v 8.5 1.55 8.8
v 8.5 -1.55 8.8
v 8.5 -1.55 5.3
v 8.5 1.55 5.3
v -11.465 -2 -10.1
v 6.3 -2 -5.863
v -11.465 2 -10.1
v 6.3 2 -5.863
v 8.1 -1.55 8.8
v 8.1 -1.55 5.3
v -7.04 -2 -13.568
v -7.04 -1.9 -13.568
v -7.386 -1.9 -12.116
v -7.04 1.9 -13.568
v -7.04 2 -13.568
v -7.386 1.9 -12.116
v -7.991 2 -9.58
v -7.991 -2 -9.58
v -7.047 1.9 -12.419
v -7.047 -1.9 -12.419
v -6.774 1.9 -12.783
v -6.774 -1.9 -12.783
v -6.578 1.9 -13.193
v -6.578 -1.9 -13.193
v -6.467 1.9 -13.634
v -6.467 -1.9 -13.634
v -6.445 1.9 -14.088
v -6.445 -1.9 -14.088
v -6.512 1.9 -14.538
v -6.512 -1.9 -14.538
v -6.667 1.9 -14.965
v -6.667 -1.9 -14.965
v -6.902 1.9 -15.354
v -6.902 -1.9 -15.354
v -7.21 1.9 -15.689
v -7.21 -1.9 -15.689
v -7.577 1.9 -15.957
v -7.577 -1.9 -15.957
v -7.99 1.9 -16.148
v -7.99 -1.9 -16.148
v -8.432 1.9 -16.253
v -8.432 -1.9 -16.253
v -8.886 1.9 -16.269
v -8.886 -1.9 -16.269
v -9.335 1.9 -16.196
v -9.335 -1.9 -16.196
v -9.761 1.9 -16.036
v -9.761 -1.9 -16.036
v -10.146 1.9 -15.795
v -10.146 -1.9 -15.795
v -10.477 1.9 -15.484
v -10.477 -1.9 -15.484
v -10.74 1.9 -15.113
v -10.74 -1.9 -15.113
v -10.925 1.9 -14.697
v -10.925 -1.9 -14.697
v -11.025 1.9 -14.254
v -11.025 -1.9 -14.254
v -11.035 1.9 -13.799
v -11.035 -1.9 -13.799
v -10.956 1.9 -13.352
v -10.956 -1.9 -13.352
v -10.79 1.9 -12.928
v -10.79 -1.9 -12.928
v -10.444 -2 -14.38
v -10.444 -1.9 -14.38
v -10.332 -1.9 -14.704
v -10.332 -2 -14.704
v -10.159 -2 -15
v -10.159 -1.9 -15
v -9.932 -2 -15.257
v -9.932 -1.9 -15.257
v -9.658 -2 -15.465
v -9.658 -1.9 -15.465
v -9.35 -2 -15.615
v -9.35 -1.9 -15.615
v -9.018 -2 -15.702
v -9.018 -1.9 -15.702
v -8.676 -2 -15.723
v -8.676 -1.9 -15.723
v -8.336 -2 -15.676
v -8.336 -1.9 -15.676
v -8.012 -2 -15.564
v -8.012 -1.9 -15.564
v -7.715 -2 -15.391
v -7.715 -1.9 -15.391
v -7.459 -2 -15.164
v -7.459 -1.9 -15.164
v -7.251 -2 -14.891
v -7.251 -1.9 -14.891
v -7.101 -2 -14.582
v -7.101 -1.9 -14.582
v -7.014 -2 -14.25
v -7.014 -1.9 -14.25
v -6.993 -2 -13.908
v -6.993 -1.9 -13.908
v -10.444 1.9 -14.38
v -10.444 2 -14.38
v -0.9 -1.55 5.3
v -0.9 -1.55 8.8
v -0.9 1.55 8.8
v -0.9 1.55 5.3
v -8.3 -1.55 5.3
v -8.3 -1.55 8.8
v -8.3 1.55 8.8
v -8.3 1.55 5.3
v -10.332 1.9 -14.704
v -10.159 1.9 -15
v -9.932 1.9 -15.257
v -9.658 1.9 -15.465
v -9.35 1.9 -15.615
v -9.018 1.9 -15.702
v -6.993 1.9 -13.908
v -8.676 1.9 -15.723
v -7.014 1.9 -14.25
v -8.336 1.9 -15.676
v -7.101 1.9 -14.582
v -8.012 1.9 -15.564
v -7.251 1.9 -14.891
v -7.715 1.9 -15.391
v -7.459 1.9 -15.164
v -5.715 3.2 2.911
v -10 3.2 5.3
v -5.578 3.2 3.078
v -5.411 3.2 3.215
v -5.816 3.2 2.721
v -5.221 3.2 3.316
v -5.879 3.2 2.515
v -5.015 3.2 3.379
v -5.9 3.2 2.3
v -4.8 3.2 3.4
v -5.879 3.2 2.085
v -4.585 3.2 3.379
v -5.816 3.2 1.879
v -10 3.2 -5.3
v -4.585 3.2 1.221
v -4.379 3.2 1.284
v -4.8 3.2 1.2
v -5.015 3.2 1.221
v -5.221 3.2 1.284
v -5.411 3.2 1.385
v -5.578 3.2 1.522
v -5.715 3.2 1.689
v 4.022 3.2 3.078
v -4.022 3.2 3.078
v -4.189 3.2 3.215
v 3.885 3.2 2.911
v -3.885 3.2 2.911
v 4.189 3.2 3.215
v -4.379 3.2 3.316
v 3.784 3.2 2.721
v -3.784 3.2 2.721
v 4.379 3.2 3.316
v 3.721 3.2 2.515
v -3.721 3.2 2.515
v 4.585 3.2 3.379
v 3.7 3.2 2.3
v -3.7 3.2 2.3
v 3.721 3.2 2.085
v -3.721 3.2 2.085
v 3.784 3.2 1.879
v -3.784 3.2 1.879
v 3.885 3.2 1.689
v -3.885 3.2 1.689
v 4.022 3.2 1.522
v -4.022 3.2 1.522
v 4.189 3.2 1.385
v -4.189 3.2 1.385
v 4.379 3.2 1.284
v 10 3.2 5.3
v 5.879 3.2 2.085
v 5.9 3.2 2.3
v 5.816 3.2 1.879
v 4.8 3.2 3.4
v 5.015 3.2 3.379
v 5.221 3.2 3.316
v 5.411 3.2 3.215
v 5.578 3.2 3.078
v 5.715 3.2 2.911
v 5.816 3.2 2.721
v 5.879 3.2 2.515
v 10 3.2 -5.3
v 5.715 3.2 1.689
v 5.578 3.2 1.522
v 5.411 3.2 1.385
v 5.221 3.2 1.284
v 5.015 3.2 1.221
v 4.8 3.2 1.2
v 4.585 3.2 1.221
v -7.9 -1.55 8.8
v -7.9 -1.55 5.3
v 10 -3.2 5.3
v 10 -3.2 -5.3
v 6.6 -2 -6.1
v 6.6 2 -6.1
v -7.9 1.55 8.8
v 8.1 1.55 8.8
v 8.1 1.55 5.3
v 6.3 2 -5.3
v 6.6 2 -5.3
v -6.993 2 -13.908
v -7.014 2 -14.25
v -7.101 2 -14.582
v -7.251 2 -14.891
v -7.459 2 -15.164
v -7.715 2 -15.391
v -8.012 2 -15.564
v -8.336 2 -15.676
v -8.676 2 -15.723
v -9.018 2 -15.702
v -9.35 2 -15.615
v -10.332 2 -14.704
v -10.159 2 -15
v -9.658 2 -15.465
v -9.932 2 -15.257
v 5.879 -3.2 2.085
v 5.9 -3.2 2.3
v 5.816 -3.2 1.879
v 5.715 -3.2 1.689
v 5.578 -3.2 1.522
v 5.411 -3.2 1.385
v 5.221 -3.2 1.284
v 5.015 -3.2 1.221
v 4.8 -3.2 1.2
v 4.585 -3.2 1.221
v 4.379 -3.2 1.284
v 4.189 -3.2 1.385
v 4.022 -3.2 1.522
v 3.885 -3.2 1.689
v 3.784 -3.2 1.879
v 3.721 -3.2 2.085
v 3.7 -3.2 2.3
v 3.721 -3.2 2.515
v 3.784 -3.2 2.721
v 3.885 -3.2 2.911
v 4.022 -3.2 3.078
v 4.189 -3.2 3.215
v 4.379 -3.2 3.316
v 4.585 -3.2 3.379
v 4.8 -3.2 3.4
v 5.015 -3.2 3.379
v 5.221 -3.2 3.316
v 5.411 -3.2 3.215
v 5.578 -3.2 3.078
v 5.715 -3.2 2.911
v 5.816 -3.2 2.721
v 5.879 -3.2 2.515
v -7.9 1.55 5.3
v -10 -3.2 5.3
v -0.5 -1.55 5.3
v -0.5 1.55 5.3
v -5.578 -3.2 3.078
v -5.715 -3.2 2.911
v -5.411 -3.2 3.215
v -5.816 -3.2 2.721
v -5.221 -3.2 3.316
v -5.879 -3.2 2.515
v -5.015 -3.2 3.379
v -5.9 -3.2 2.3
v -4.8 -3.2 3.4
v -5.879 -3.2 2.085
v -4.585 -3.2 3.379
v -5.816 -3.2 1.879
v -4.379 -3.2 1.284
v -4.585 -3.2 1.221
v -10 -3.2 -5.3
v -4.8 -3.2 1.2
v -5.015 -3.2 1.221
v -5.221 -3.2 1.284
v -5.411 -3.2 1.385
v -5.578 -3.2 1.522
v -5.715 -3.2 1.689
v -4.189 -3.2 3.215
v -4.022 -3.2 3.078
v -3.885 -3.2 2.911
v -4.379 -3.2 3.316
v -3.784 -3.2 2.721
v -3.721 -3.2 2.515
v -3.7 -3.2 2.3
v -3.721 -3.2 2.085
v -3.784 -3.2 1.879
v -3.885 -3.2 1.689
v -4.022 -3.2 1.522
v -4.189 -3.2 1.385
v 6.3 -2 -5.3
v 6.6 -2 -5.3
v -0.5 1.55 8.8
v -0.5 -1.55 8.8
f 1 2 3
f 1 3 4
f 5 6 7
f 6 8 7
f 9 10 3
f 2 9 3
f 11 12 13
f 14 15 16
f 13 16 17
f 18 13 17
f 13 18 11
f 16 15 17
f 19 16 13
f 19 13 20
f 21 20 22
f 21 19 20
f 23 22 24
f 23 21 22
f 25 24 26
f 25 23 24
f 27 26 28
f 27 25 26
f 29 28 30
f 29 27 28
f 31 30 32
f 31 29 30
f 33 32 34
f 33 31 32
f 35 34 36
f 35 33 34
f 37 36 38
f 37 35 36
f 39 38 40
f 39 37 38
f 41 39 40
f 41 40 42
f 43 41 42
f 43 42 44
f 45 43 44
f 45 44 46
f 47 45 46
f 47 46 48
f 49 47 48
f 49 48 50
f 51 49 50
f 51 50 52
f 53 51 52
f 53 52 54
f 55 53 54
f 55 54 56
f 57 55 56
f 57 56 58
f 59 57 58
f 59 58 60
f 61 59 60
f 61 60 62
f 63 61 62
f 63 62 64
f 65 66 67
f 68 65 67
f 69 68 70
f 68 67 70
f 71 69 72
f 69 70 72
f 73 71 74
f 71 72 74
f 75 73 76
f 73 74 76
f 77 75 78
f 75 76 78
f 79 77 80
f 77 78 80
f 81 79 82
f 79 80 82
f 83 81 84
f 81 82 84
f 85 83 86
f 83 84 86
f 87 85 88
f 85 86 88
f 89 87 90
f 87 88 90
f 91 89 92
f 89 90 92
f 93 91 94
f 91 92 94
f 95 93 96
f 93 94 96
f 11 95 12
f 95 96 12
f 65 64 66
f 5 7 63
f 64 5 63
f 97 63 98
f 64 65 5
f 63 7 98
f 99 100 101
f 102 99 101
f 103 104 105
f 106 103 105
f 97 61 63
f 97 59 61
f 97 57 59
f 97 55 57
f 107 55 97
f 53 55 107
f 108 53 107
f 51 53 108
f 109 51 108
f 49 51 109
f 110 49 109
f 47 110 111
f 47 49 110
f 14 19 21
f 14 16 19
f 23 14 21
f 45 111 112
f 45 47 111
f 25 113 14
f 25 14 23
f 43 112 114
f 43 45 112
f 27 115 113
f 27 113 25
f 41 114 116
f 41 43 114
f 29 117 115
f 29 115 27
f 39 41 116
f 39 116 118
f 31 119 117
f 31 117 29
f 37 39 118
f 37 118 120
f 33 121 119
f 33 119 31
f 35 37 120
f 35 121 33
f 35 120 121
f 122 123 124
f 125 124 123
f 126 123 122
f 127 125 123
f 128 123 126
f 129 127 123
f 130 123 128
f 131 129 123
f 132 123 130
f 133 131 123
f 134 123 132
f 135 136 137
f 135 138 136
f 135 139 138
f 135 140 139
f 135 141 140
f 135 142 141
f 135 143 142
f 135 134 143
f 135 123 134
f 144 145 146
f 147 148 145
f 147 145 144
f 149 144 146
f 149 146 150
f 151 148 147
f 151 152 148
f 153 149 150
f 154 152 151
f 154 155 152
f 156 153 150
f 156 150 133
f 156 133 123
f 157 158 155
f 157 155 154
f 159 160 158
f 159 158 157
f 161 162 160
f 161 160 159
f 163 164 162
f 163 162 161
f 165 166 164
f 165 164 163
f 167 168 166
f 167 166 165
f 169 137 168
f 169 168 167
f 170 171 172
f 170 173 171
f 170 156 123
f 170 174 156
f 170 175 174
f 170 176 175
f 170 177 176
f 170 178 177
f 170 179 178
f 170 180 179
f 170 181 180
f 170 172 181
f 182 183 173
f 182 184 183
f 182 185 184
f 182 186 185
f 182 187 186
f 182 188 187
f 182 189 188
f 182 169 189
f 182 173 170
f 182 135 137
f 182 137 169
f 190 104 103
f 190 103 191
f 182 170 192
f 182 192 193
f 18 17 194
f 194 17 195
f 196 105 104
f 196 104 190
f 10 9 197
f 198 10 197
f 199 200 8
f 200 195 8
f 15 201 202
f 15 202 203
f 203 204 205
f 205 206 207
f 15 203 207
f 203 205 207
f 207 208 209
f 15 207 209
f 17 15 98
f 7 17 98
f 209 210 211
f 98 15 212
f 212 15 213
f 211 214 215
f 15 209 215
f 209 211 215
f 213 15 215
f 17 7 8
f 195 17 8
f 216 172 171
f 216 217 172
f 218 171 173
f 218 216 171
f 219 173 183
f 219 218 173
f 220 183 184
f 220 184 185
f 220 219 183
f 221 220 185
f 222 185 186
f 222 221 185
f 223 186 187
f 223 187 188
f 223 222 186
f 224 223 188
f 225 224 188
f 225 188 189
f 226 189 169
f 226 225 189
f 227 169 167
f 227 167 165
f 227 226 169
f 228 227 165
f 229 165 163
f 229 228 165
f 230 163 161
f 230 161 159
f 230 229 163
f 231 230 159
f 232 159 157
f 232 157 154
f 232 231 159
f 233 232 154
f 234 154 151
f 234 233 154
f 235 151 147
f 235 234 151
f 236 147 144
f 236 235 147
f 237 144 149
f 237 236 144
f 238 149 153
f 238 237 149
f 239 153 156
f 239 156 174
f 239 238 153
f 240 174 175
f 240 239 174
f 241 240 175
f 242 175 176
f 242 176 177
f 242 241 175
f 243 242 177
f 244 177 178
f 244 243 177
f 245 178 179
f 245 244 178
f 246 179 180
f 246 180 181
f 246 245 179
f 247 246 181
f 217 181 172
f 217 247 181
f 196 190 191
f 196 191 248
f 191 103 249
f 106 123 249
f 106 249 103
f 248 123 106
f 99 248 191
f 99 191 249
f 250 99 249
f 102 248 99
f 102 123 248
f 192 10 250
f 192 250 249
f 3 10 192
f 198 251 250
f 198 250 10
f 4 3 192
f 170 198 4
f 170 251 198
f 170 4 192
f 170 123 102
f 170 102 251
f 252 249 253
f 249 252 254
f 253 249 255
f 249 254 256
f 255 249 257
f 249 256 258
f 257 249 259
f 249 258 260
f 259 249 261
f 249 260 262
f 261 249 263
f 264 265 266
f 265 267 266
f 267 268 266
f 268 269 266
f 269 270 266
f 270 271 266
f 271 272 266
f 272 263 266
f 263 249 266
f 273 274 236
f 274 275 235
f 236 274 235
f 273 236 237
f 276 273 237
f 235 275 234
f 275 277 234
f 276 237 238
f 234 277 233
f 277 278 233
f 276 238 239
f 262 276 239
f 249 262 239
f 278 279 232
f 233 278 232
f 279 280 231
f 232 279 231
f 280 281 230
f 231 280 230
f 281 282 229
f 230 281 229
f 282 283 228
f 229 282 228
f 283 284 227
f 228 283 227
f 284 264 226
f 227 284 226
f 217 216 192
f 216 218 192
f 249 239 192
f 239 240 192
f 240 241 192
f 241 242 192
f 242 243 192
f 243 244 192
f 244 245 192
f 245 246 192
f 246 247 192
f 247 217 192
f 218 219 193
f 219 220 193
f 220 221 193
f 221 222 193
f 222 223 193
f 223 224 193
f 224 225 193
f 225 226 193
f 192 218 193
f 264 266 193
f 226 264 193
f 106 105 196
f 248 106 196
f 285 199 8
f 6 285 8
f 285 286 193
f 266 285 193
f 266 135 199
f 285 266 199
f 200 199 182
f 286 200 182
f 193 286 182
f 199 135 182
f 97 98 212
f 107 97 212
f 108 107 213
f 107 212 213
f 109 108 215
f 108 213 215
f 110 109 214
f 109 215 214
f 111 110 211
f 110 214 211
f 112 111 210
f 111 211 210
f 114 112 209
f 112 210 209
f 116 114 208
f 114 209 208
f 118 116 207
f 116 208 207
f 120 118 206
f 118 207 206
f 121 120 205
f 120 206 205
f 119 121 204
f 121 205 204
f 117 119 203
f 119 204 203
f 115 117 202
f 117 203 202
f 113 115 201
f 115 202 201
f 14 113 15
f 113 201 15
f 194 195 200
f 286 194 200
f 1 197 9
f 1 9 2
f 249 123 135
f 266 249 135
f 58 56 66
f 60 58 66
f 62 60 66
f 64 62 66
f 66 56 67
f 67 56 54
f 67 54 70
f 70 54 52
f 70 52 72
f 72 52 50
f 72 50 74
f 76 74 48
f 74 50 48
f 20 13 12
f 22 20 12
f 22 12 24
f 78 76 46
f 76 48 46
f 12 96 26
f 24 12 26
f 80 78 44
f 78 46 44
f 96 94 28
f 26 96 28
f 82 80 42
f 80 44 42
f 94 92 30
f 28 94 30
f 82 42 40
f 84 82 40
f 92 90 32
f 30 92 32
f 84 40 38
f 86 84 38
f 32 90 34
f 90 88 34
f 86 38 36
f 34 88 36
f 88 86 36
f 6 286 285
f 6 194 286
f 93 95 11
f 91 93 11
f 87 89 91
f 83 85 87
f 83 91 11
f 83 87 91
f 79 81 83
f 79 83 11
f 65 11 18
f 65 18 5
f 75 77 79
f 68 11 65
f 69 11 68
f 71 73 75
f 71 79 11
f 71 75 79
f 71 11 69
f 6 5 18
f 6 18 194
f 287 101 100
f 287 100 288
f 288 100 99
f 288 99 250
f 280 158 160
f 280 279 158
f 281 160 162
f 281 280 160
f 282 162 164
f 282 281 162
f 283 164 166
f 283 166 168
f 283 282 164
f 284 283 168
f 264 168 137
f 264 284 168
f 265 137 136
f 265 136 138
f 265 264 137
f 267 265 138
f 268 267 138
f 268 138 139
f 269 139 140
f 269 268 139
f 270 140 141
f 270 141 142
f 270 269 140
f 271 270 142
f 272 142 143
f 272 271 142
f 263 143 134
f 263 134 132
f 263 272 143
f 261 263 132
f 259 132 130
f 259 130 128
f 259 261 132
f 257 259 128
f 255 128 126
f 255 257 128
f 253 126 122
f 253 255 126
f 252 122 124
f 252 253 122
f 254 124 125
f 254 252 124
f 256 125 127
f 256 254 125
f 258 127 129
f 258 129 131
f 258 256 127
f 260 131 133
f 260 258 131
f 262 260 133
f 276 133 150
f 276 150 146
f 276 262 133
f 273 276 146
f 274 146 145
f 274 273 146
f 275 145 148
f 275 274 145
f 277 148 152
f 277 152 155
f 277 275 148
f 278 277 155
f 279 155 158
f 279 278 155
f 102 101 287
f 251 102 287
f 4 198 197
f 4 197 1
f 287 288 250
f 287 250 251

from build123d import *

# Parameters (mm, degrees)
SKETCH_1_W      = 20
SKETCH_1_H      = 10.6
SKETCH_1_R      = 1.1
EXTRUDE_1_DEPTH = 3.2
SKETCH_3_W      = 0.4
SKETCH_3_H      = 3.1
EXTRUDE_2_DEPTH = 3.5
EXTRUDE_3_DEPTH = 2
SKETCH_5_R      = 2.3
EXTRUDE_4_DEPTH = 1.9


with BuildPart() as part:
    # 草图1 → 凸台-拉伸1 (new body, symmetric)
    with BuildSketch(Plane(origin=(0, 0, 0), x_dir=(1, 0, 0), z_dir=(0, 1, 0))):
        Rectangle(SKETCH_1_W, SKETCH_1_H)
        with Locations((-4.8, -2.3)):
            Circle(SKETCH_1_R, mode=Mode.SUBTRACT)
        with Locations((4.8, -2.3)):
            Circle(SKETCH_1_R, mode=Mode.SUBTRACT)
    extrude(amount=EXTRUDE_1_DEPTH, both=True)

    # 草图3 → 凸台-拉伸2 (add)
    with BuildSketch(Plane.XY.offset(5.3)):
        with Locations((-8.1, 0)):
            Rectangle(SKETCH_3_W, SKETCH_3_H)
        with Locations((-0.7, 0)):
            Rectangle(SKETCH_3_W, SKETCH_3_H)
        with Locations((8.3, 0)):
            Rectangle(SKETCH_3_W, SKETCH_3_H)
    extrude(amount=EXTRUDE_2_DEPTH)

    # 草图4 → 凸台-拉伸3 (add, symmetric)
    with BuildSketch(Plane(origin=(0, 0, 0), x_dir=(1, 0, 0), z_dir=(0, 1, 0))):
        with BuildLine():
            Line((6.3, 4.662469082), (6.3, 5.863134893))
            Line((6.3, 5.863134893), (-11.464883061, 10.1))
            Line((-11.464883061, 10.1), (-10.444126954, 14.379959926))
            ThreePointArc((-10.444126954, 14.379959926), (-8.335887623, 15.676234173), (-7.039613376, 13.567994841))
            Line((-7.039613376, 13.567994841), (-7.990772476, 9.579850364))
            Line((-7.990772476, 9.579850364), (6.6, 6.1))
            Line((6.6, 6.1), (6.6, 4.662469082))
            Line((6.6, 4.662469082), (6.3, 4.662469082))
        make_face()
    extrude(amount=EXTRUDE_3_DEPTH, both=True)

    # 草图5 → 凸台-拉伸4 (add, symmetric)
    with BuildSketch(Plane(origin=(0, 0, 0), x_dir=(1, 0, 0), z_dir=(0, 1, 0))):
        with Locations((-8.741870165, 13.973977384)):
            Circle(SKETCH_5_R)
    extrude(amount=EXTRUDE_4_DEPTH, both=True)


solid = part.part
